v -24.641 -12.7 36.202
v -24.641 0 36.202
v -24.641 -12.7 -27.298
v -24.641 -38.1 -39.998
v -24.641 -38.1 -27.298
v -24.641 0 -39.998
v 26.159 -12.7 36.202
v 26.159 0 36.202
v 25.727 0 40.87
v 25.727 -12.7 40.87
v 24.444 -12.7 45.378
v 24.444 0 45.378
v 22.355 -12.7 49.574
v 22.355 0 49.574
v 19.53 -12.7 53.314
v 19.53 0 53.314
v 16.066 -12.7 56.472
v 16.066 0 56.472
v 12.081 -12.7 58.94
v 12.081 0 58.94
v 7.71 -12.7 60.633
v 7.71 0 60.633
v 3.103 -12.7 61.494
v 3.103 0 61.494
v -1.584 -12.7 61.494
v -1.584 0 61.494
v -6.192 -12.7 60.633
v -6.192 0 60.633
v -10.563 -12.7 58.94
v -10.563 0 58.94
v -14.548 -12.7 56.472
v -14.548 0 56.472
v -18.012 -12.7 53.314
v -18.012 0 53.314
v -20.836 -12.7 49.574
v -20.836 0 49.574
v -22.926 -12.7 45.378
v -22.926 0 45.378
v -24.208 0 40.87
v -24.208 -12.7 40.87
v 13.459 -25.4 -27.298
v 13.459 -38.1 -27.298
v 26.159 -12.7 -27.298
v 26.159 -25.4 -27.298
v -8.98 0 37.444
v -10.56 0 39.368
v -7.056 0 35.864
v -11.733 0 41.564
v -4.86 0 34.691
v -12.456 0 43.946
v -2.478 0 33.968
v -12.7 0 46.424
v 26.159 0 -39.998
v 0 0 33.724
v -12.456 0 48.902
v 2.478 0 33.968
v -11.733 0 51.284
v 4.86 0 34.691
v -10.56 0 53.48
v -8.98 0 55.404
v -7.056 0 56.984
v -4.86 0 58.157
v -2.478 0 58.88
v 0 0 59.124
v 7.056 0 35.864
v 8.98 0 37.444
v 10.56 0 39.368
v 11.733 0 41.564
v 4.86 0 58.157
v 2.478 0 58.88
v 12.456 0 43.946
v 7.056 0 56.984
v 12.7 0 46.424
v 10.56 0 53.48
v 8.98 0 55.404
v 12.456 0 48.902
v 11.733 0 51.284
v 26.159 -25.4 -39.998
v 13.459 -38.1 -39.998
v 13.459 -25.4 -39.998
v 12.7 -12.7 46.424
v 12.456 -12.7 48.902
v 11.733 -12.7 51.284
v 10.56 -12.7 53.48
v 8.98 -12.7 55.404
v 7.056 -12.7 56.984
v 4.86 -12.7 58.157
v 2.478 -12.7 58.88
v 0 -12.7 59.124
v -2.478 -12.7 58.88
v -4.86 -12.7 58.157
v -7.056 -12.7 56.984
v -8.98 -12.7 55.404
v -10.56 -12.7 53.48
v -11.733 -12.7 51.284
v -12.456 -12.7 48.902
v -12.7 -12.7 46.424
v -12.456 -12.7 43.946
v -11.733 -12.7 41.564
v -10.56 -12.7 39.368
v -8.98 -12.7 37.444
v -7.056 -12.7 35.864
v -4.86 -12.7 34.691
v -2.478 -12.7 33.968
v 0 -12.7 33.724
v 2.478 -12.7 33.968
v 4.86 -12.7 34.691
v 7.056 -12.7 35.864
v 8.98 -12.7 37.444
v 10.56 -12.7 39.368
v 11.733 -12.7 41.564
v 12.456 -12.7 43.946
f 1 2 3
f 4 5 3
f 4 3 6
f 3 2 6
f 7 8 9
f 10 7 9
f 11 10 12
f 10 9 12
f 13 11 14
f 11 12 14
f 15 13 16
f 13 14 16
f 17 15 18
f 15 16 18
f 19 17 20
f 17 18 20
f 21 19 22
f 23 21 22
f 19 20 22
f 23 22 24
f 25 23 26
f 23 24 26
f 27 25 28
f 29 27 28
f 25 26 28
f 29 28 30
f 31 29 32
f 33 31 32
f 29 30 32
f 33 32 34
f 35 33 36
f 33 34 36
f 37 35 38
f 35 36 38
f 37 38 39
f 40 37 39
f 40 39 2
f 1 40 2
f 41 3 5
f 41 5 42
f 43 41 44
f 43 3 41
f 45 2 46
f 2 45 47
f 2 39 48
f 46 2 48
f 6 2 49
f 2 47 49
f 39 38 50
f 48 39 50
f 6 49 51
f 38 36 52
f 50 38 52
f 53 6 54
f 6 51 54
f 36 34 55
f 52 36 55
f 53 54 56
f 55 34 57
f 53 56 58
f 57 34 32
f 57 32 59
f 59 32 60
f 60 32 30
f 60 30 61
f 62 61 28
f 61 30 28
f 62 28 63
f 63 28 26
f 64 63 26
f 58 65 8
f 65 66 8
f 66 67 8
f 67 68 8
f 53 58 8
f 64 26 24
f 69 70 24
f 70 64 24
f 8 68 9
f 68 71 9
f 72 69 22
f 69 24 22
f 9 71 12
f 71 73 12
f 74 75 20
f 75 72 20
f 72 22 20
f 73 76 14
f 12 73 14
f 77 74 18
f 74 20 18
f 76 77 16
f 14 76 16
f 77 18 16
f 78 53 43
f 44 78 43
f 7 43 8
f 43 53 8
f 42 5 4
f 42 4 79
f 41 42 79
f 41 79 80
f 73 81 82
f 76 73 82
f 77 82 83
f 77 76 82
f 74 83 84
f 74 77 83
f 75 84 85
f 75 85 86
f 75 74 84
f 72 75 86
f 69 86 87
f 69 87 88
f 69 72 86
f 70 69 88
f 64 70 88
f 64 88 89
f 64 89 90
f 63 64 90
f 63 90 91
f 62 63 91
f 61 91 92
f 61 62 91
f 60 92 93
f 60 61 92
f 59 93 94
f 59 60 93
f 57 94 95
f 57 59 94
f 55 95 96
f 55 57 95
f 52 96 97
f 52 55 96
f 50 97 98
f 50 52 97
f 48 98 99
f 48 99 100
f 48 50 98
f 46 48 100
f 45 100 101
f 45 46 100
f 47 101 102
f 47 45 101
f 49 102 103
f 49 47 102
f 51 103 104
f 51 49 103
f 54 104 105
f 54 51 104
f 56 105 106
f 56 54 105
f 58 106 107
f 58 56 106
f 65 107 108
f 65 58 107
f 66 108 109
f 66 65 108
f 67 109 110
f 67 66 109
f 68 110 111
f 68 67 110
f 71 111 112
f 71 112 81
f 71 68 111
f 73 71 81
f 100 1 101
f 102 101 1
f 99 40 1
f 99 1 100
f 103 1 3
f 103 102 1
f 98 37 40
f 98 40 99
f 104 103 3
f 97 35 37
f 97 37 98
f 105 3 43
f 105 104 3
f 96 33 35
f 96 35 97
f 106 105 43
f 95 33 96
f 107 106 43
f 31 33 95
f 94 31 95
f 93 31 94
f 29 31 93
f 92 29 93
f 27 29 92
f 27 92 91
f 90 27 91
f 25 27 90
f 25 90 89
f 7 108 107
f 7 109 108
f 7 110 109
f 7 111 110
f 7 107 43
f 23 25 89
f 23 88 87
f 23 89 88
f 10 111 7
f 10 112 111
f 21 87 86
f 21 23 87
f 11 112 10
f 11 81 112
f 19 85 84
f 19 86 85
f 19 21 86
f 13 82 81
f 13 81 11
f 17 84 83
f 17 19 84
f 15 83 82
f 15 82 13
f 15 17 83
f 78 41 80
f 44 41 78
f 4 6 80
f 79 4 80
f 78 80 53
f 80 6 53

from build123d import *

# Parameters (mm, degrees)
F1_DEPTH = 12.7
F2_R     = 12.7
F3_DEPTH = 12.7
F4_W     = 50.8
F4_H     = 12.7
F5_DEPTH = 38.1
F6_W     = 12.7
F6_H     = 12.7
F7_DEPTH = 39.998543


with BuildPart() as f1:
    # F0 (on Front) → F1 (new body)
    with BuildSketch(Plane.XZ):
        with BuildLine():
            ThreePointArc((26.159194, 36.202457), (0.759194, 61.602457), (-24.640806, 36.202457))
            Line((-24.640806, 36.202457), (26.159194, 36.202457))
        make_face()
        with BuildLine():
            ThreePointArc((26.159194, 36.202457), (0.759194, 10.802457), (-24.640806, 36.202457))
            Line((-24.640806, 36.202457), (-24.640806, -39.997543))
            Line((-24.640806, -39.997543), (26.159194, -39.997543))
            Line((26.159194, -39.997543), (26.159194, 36.202457))
        make_face()
        with BuildLine():
            Line((26.159194, 36.202457), (-24.640806, 36.202457))
            ThreePointArc((-24.640806, 36.202457), (0.759194, 10.802457), (26.159194, 36.202457))
        make_face()
    extrude(amount=F1_DEPTH)

    # F2 (on Front) → F3 (cut)
    with BuildSketch(Plane.XZ):
        with Locations((0, 46.423854)):
            Circle(F2_R)
    extrude(amount=F3_DEPTH, mode=Mode.SUBTRACT)

    # F4 (on Front) → F5 (join)
    with BuildSketch(Plane.XZ):
        with Locations((0.759194, -33.647543)):
            Rectangle(F4_W, F4_H)
    extrude(amount=F5_DEPTH)

    # F6 (on Top) → F7 (cut, through all)
    with BuildSketch(Plane.XY):
        with Locations((19.809194, -31.75)):
            Rectangle(F6_W, F6_H)
    extrude(amount=-F7_DEPTH, mode=Mode.SUBTRACT)


solid = f1.part
